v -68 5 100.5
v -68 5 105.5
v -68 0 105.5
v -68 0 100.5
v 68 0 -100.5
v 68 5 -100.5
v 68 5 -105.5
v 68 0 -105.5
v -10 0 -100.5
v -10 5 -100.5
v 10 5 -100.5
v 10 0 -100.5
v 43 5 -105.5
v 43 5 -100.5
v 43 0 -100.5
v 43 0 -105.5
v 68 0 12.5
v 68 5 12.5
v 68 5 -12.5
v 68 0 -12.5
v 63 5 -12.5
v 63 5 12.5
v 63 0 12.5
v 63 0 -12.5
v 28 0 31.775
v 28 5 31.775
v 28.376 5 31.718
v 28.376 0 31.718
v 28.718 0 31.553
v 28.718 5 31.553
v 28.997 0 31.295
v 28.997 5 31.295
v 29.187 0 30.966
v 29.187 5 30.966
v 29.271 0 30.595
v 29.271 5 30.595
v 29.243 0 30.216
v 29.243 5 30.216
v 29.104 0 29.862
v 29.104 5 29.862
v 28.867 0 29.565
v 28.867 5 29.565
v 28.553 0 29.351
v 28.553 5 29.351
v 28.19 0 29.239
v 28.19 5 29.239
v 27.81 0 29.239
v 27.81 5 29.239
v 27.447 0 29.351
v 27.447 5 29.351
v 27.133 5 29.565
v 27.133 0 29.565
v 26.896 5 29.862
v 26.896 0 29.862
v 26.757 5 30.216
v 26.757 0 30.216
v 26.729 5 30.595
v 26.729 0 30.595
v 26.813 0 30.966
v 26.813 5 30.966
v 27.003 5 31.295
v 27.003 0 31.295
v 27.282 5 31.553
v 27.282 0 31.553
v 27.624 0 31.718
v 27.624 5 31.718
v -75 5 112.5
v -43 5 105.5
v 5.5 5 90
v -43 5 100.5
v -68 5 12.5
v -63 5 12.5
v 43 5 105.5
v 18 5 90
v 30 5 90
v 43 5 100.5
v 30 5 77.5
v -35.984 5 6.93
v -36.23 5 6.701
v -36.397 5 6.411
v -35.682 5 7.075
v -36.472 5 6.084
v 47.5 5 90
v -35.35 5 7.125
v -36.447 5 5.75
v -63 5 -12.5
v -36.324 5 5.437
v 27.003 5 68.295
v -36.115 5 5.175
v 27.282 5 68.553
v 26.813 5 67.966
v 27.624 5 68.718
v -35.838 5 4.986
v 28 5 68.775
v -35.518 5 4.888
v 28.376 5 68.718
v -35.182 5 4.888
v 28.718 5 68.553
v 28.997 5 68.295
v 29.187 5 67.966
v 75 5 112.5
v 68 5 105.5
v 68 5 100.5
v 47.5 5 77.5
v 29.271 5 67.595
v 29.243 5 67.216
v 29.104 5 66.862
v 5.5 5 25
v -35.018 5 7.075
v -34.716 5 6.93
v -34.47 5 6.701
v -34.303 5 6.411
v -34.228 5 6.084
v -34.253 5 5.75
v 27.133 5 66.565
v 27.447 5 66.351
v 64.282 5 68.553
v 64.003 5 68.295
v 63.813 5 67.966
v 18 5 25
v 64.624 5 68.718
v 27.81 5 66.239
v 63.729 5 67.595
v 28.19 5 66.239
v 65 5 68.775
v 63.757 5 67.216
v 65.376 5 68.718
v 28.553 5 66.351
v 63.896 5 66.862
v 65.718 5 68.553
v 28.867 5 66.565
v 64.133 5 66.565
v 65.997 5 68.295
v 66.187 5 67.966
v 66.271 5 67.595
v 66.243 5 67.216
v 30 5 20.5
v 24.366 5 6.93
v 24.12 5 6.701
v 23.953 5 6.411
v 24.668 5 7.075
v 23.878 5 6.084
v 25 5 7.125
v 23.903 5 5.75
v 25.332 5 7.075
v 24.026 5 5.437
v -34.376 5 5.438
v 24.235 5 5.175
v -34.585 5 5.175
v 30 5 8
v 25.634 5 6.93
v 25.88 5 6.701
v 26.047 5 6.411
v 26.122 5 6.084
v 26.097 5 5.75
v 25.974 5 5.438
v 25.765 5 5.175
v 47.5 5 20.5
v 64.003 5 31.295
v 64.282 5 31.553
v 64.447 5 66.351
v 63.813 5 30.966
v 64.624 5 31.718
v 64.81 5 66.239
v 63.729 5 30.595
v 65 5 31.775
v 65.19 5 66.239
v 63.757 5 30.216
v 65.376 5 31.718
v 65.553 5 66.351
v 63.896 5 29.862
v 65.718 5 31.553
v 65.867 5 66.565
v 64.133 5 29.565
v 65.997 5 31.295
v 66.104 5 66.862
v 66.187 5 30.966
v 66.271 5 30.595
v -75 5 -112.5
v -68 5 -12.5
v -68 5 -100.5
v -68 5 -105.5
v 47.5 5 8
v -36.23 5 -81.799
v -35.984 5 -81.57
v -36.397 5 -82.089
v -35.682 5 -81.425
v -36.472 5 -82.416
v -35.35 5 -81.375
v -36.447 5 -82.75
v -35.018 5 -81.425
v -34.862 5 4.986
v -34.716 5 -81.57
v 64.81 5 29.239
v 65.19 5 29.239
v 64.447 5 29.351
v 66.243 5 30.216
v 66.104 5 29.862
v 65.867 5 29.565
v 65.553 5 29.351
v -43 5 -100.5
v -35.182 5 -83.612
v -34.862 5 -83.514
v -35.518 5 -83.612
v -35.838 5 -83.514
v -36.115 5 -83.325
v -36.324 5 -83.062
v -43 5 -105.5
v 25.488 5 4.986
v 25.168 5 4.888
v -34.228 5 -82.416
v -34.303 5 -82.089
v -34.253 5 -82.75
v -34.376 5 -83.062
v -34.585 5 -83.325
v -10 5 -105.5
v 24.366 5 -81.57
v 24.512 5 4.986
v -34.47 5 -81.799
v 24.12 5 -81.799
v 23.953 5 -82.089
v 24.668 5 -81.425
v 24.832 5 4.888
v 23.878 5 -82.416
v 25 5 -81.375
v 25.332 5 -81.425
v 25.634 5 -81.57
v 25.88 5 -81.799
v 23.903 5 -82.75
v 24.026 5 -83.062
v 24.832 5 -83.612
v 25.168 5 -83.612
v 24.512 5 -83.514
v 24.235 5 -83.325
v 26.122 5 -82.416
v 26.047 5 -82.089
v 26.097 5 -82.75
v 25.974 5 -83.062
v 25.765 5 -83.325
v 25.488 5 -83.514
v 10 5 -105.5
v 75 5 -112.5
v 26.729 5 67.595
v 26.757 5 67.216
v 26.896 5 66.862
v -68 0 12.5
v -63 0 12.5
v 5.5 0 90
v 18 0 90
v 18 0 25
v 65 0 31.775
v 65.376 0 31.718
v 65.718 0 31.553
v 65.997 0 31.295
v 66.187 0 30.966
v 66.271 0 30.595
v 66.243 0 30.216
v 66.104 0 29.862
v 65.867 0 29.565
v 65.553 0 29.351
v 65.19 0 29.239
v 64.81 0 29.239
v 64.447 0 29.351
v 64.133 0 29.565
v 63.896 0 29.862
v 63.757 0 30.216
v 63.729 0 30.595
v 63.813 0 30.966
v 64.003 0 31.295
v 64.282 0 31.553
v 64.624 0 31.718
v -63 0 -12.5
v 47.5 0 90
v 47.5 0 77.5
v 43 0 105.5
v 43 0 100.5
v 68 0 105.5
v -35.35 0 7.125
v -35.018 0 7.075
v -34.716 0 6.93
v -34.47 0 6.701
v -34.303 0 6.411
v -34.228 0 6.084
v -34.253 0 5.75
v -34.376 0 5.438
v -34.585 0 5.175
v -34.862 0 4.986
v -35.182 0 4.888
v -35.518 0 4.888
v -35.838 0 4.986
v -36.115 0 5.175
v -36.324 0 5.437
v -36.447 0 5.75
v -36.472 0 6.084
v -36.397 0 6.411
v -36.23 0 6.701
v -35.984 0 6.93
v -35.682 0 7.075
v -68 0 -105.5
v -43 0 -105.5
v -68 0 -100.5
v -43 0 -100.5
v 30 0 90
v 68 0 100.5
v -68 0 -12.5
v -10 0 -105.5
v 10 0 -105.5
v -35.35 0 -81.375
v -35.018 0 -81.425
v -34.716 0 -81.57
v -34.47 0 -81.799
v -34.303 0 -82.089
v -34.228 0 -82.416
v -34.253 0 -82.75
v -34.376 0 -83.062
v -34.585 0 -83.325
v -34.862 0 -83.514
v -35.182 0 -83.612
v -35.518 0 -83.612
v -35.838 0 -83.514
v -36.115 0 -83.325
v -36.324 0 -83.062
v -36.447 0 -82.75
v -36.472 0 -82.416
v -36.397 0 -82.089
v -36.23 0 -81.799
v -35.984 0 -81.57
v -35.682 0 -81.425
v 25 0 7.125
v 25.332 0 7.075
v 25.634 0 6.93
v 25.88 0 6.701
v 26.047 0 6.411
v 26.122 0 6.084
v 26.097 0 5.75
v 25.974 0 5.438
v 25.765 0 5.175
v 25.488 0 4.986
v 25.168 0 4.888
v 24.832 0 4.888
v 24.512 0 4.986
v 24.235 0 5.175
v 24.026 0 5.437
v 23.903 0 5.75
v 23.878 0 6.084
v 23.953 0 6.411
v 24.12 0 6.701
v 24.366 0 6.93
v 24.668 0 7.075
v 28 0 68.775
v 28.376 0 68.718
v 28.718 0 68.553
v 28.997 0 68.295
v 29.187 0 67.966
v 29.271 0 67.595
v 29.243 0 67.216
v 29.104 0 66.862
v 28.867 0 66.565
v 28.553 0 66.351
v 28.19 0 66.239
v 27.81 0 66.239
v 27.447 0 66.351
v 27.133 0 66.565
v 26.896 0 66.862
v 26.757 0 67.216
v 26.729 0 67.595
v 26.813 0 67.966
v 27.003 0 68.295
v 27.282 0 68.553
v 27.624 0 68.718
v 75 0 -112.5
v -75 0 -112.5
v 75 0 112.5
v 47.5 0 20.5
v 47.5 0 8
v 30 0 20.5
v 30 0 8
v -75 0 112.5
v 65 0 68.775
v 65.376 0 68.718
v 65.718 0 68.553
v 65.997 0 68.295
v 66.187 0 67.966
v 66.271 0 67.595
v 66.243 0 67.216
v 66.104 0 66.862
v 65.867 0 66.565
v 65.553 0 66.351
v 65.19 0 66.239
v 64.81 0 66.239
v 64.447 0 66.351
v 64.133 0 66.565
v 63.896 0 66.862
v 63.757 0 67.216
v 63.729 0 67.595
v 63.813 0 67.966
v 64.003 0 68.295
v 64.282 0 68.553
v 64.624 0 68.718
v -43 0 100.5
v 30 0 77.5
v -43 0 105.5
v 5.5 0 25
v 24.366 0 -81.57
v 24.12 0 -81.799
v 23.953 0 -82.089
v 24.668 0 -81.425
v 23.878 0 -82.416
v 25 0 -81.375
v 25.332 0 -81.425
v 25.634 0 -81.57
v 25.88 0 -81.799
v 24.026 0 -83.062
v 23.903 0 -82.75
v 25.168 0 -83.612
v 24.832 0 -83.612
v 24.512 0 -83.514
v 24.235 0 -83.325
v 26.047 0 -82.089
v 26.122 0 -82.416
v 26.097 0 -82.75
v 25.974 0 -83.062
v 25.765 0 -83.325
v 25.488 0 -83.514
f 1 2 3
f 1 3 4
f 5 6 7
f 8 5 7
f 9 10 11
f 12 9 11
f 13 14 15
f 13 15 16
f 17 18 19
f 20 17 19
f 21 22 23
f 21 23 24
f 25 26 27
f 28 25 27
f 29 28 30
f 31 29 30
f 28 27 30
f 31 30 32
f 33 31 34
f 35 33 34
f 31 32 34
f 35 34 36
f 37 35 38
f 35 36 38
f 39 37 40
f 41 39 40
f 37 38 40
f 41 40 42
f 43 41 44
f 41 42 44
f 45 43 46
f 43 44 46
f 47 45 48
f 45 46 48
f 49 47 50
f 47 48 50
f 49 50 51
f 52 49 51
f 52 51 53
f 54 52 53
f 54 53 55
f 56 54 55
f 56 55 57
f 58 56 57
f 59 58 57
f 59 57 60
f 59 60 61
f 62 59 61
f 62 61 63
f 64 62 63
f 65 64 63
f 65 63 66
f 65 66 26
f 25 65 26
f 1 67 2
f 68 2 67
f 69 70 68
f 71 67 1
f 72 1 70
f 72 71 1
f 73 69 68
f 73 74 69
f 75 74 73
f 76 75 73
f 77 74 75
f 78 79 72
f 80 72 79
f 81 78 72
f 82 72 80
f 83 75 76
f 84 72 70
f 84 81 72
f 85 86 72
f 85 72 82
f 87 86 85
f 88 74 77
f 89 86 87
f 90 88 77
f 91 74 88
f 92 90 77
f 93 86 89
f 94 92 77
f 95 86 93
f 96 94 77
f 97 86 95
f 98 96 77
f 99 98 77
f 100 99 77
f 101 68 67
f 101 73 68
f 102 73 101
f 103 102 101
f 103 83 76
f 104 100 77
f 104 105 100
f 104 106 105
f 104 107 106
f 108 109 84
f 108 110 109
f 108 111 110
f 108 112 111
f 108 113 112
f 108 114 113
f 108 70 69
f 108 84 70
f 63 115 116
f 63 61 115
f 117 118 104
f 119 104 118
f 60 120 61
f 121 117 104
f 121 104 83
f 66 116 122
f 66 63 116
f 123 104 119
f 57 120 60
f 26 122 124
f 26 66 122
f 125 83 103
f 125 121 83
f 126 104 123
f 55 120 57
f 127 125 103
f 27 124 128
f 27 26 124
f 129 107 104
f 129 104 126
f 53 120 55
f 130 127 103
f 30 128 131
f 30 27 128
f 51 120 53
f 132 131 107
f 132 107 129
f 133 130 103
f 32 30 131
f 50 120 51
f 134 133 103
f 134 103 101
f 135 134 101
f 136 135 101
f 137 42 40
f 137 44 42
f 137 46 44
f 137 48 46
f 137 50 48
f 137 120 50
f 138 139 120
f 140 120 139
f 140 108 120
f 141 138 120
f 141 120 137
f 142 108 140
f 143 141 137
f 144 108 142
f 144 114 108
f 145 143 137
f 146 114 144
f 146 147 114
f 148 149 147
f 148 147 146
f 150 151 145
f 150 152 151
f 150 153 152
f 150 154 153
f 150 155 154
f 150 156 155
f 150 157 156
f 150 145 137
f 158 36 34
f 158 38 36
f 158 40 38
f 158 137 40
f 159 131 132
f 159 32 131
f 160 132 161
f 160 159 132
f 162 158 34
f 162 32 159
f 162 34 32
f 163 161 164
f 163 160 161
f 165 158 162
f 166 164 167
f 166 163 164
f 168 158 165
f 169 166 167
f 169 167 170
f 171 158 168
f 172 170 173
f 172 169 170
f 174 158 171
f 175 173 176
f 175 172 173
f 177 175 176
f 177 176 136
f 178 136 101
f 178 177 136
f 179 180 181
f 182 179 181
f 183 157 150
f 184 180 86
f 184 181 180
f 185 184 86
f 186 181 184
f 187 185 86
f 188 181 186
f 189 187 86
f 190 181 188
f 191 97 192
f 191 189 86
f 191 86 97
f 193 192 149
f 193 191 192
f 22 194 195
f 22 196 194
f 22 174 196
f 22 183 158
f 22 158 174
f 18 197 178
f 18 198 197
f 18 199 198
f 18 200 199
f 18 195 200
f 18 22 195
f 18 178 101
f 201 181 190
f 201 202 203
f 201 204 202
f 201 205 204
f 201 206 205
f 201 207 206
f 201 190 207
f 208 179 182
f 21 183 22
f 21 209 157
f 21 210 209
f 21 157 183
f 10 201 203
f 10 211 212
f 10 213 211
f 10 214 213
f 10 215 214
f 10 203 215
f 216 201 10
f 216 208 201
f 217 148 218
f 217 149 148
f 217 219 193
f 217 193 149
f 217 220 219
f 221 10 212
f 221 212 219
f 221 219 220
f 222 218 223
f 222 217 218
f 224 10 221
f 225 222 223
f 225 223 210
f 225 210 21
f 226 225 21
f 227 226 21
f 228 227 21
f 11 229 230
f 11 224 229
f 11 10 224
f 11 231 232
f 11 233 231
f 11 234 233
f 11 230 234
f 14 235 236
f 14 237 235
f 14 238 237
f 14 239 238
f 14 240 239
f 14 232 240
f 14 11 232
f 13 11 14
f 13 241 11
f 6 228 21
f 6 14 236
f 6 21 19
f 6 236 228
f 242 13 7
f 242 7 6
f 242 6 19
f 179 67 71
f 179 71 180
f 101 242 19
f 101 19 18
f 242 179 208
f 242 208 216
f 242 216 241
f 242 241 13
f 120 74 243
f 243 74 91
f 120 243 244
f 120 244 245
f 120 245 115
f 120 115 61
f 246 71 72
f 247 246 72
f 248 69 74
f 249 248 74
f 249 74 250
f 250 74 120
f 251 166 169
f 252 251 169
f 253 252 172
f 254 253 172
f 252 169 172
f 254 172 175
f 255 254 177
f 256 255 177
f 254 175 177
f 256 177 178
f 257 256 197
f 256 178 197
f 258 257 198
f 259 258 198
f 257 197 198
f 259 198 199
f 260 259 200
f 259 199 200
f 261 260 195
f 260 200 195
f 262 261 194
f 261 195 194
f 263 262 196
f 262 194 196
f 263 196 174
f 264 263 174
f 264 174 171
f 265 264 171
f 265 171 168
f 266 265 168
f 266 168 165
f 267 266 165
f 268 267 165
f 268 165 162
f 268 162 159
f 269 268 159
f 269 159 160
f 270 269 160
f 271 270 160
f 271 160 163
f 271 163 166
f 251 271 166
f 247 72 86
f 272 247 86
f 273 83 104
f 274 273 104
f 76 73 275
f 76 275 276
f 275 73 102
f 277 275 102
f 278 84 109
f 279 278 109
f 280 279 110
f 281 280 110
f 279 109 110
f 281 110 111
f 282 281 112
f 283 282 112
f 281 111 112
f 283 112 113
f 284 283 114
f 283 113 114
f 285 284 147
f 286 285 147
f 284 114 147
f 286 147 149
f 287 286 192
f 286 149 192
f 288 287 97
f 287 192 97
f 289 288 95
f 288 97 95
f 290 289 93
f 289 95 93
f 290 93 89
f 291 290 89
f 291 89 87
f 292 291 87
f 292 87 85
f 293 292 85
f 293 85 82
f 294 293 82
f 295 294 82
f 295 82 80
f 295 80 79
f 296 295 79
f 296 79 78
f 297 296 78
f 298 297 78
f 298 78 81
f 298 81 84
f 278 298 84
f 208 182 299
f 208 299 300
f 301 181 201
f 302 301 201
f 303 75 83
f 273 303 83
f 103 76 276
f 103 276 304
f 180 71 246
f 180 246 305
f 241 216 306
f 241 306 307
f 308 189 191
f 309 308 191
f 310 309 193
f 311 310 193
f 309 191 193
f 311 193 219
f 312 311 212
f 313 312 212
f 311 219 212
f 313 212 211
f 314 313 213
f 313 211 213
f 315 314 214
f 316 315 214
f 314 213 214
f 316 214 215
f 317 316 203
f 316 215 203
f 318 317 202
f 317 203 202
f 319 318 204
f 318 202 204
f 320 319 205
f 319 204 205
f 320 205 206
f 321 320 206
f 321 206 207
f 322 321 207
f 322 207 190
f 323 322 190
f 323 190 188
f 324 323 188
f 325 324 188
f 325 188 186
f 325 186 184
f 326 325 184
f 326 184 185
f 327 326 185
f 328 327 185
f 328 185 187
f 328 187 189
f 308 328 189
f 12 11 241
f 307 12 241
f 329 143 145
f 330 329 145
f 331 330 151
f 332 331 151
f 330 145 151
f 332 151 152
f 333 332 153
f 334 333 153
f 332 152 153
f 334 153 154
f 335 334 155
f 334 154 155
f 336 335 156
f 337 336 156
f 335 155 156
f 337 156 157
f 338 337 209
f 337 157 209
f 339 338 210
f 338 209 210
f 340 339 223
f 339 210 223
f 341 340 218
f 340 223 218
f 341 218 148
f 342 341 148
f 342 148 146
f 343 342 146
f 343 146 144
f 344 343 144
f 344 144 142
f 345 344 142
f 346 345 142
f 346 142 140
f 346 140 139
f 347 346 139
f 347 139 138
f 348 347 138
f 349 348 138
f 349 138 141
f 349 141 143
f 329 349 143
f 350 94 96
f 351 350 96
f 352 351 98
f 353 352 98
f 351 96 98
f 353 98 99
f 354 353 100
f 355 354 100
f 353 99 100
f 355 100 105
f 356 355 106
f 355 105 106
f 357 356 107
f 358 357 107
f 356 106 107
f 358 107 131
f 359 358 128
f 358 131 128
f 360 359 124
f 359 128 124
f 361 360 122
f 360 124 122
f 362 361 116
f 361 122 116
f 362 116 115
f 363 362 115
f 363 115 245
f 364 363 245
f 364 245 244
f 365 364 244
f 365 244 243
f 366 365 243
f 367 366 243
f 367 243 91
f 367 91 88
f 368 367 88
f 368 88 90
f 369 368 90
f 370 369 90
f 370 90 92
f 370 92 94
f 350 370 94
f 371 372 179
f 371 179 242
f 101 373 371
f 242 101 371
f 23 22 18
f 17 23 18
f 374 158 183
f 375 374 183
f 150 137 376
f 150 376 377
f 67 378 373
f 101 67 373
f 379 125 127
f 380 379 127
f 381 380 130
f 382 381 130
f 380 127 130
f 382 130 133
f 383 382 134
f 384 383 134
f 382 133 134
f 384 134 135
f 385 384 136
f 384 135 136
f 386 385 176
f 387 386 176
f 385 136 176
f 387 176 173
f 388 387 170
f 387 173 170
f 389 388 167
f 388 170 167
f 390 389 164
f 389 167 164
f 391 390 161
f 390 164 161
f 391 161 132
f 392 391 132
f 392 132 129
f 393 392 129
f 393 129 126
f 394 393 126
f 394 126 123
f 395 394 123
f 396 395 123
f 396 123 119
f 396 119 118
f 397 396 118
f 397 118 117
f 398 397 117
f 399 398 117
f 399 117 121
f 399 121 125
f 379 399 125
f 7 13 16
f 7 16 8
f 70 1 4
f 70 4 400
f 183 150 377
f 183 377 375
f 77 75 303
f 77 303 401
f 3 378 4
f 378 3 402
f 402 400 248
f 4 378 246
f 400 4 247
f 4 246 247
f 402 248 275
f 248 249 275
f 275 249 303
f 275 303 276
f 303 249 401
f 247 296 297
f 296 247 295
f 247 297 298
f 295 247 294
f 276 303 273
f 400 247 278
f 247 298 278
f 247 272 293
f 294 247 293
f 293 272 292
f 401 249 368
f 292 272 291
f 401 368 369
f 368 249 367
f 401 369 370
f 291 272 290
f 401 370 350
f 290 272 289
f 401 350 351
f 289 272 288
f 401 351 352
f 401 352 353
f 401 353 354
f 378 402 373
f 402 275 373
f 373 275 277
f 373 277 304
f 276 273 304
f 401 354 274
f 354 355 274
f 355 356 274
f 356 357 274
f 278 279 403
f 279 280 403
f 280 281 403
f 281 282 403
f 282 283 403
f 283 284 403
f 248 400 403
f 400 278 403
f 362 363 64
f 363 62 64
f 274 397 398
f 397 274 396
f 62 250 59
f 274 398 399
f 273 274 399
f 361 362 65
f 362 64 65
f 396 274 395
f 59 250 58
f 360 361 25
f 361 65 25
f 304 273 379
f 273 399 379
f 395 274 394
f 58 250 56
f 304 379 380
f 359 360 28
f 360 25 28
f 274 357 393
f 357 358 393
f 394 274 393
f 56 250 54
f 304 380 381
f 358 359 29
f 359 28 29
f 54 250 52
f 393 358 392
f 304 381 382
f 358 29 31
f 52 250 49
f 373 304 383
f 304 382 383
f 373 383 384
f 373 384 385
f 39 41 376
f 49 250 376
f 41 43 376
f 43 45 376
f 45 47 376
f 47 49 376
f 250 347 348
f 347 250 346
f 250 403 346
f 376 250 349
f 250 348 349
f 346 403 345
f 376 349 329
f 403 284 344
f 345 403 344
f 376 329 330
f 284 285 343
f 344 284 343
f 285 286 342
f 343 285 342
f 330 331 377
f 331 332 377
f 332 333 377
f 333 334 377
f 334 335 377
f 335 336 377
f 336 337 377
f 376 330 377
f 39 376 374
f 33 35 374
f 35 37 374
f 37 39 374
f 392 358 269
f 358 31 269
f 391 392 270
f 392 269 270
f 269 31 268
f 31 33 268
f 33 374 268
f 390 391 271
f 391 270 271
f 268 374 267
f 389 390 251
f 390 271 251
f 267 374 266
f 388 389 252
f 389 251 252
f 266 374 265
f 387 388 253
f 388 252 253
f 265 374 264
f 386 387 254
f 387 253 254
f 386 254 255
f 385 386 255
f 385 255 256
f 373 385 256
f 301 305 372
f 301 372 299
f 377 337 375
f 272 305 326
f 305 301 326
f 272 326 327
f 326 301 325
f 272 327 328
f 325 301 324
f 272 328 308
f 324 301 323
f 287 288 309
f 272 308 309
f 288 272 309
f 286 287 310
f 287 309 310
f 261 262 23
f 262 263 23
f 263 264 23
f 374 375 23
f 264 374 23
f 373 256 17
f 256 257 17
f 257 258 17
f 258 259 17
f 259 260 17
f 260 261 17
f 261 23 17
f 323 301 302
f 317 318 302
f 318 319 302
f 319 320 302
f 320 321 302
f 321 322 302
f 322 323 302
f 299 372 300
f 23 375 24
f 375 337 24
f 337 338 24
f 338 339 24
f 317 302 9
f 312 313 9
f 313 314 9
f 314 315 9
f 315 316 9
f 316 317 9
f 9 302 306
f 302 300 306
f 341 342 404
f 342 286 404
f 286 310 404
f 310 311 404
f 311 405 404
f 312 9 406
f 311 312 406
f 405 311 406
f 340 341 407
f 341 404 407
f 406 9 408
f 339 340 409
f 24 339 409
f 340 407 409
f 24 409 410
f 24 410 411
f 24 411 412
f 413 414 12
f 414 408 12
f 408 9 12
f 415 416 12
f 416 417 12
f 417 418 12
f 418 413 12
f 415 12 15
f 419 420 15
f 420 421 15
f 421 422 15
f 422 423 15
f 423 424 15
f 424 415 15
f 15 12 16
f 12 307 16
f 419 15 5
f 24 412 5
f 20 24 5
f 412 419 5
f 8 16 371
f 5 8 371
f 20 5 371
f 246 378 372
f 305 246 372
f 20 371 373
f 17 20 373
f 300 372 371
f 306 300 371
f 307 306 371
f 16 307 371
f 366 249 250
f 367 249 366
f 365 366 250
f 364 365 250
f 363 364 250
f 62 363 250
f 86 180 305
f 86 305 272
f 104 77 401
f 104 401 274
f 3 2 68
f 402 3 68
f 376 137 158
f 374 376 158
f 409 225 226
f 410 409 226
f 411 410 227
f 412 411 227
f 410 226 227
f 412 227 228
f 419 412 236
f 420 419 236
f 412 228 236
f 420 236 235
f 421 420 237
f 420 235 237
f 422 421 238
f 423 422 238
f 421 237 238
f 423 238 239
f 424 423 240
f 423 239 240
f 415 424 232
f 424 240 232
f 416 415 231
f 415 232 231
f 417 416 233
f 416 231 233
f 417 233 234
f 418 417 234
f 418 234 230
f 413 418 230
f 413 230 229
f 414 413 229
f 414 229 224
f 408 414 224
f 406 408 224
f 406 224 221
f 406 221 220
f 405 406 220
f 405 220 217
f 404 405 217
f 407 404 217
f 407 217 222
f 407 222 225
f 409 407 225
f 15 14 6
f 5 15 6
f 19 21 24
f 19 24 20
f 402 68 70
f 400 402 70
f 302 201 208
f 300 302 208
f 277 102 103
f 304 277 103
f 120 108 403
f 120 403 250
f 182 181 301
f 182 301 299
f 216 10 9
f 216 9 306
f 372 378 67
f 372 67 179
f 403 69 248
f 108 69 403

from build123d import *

# Parameters (mm, degrees)
SKETCH1_W           = 150
SKETCH1_H           = 225
BOSS_EXTRUDE1_DEPTH = 5
SKETCH2_R           = 1.125
CUT_EXTRUDE1_DEPTH  = 136.300591277
SKETCH3_R           = 1.275
CUT_EXTRUDE2_DEPTH  = 136.300591277
SKETCH6_W           = 20
SKETCH6_H           = 5
CUT_EXTRUDE3_DEPTH  = 136.300591277
SKETCH9_W           = 12.5
SKETCH9_H           = 65
SKETCH9_W_2         = 17.5
SKETCH9_H_2         = 12.5
CUT_EXTRUDE4_DEPTH  = 5
SKETCH10_W          = 25
SKETCH10_H          = 5
SKETCH10_W_2        = 5
SKETCH10_H_2        = 25
CUT_EXTRUDE5_DEPTH  = 5


with BuildPart() as part:
    # Sketch1 → Boss-Extrude1 (new body)
    with BuildSketch(Plane(origin=(0, 0, 0), x_dir=(1, 0, 0), z_dir=(0, 1, 0))):
        Rectangle(SKETCH1_W, SKETCH1_H)
    extrude(amount=BOSS_EXTRUDE1_DEPTH)

    # Sketch2 → Cut-Extrude1 (cut, through all)
    with BuildSketch(Plane(origin=(0, 5, 0), x_dir=(1, 0, 0), z_dir=(0, 1, 0))):
        with Locations(Location((-35.35, 82.5, 0), (0, 0, 270))):
            Circle(SKETCH2_R)
        with Locations(Location((25, 82.5, 0), (0, 0, 270))):
            Circle(SKETCH2_R)
        with Locations(Location((25, -6, 0), (0, 0, 270))):
            Circle(SKETCH2_R)
        with Locations(Location((-35.35, -6, 0), (0, 0, 270))):
            Circle(SKETCH2_R)
    extrude(amount=-CUT_EXTRUDE1_DEPTH, mode=Mode.SUBTRACT)

    # Sketch3 → Cut-Extrude2 (cut, through all)
    with BuildSketch(Plane(origin=(0, 5, 0), x_dir=(1, 0, 0), z_dir=(0, 1, 0))):
        with Locations(Location((28, -30.5, 0), (0, 0, 270))):
            Circle(SKETCH3_R)
        with Locations(Location((65, -30.5, 0), (0, 0, 270))):
            Circle(SKETCH3_R)
        with Locations(Location((65, -67.5, 0), (0, 0, 270))):
            Circle(SKETCH3_R)
        with Locations(Location((28, -67.5, 0), (0, 0, 270))):
            Circle(SKETCH3_R)
    extrude(amount=-CUT_EXTRUDE2_DEPTH, mode=Mode.SUBTRACT)

    # Sketch6 → Cut-Extrude3 (cut, through all)
    with BuildSketch(Plane(origin=(0, 5, 0), x_dir=(1, 0, 0), z_dir=(0, 1, 0))):
        with Locations((0, 103)):
            Rectangle(SKETCH6_W, SKETCH6_H)
    extrude(amount=-CUT_EXTRUDE3_DEPTH, mode=Mode.SUBTRACT)

    # Sketch9 → Cut-Extrude4 (cut)
    with BuildSketch(Plane(origin=(0, 5, 0), x_dir=(1, 0, 0), z_dir=(0, 1, 0))):
        with Locations((11.75, -57.5)):
            Rectangle(SKETCH9_W, SKETCH9_H)
        with Locations((38.75, -14.25)):
            Rectangle(SKETCH9_W_2, SKETCH9_H_2)
        with Locations((38.75, -83.75)):
            Rectangle(SKETCH9_W_2, SKETCH9_H_2)
    extrude(amount=-CUT_EXTRUDE4_DEPTH, mode=Mode.SUBTRACT)

    # Sketch10 → Cut-Extrude5 (cut)
    with BuildSketch(Plane(origin=(0, 5, 0), x_dir=(1, 0, 0), z_dir=(0, 1, 0))):
        with Locations((-55.5, -103)):
            Rectangle(SKETCH10_W, SKETCH10_H)
        with Locations((-55.5, 103)):
            Rectangle(SKETCH10_W, SKETCH10_H)
        with Locations((55.5, -103)):
            Rectangle(SKETCH10_W, SKETCH10_H)
        with Locations((55.5, 103)):
            Rectangle(SKETCH10_W, SKETCH10_H)
        with Locations((65.5, 0)):
            Rectangle(SKETCH10_W_2, SKETCH10_H_2)
        with Locations((-65.5, 0)):
            Rectangle(SKETCH10_W_2, SKETCH10_H_2)
    extrude(amount=-CUT_EXTRUDE5_DEPTH, mode=Mode.SUBTRACT)


solid = part.part
